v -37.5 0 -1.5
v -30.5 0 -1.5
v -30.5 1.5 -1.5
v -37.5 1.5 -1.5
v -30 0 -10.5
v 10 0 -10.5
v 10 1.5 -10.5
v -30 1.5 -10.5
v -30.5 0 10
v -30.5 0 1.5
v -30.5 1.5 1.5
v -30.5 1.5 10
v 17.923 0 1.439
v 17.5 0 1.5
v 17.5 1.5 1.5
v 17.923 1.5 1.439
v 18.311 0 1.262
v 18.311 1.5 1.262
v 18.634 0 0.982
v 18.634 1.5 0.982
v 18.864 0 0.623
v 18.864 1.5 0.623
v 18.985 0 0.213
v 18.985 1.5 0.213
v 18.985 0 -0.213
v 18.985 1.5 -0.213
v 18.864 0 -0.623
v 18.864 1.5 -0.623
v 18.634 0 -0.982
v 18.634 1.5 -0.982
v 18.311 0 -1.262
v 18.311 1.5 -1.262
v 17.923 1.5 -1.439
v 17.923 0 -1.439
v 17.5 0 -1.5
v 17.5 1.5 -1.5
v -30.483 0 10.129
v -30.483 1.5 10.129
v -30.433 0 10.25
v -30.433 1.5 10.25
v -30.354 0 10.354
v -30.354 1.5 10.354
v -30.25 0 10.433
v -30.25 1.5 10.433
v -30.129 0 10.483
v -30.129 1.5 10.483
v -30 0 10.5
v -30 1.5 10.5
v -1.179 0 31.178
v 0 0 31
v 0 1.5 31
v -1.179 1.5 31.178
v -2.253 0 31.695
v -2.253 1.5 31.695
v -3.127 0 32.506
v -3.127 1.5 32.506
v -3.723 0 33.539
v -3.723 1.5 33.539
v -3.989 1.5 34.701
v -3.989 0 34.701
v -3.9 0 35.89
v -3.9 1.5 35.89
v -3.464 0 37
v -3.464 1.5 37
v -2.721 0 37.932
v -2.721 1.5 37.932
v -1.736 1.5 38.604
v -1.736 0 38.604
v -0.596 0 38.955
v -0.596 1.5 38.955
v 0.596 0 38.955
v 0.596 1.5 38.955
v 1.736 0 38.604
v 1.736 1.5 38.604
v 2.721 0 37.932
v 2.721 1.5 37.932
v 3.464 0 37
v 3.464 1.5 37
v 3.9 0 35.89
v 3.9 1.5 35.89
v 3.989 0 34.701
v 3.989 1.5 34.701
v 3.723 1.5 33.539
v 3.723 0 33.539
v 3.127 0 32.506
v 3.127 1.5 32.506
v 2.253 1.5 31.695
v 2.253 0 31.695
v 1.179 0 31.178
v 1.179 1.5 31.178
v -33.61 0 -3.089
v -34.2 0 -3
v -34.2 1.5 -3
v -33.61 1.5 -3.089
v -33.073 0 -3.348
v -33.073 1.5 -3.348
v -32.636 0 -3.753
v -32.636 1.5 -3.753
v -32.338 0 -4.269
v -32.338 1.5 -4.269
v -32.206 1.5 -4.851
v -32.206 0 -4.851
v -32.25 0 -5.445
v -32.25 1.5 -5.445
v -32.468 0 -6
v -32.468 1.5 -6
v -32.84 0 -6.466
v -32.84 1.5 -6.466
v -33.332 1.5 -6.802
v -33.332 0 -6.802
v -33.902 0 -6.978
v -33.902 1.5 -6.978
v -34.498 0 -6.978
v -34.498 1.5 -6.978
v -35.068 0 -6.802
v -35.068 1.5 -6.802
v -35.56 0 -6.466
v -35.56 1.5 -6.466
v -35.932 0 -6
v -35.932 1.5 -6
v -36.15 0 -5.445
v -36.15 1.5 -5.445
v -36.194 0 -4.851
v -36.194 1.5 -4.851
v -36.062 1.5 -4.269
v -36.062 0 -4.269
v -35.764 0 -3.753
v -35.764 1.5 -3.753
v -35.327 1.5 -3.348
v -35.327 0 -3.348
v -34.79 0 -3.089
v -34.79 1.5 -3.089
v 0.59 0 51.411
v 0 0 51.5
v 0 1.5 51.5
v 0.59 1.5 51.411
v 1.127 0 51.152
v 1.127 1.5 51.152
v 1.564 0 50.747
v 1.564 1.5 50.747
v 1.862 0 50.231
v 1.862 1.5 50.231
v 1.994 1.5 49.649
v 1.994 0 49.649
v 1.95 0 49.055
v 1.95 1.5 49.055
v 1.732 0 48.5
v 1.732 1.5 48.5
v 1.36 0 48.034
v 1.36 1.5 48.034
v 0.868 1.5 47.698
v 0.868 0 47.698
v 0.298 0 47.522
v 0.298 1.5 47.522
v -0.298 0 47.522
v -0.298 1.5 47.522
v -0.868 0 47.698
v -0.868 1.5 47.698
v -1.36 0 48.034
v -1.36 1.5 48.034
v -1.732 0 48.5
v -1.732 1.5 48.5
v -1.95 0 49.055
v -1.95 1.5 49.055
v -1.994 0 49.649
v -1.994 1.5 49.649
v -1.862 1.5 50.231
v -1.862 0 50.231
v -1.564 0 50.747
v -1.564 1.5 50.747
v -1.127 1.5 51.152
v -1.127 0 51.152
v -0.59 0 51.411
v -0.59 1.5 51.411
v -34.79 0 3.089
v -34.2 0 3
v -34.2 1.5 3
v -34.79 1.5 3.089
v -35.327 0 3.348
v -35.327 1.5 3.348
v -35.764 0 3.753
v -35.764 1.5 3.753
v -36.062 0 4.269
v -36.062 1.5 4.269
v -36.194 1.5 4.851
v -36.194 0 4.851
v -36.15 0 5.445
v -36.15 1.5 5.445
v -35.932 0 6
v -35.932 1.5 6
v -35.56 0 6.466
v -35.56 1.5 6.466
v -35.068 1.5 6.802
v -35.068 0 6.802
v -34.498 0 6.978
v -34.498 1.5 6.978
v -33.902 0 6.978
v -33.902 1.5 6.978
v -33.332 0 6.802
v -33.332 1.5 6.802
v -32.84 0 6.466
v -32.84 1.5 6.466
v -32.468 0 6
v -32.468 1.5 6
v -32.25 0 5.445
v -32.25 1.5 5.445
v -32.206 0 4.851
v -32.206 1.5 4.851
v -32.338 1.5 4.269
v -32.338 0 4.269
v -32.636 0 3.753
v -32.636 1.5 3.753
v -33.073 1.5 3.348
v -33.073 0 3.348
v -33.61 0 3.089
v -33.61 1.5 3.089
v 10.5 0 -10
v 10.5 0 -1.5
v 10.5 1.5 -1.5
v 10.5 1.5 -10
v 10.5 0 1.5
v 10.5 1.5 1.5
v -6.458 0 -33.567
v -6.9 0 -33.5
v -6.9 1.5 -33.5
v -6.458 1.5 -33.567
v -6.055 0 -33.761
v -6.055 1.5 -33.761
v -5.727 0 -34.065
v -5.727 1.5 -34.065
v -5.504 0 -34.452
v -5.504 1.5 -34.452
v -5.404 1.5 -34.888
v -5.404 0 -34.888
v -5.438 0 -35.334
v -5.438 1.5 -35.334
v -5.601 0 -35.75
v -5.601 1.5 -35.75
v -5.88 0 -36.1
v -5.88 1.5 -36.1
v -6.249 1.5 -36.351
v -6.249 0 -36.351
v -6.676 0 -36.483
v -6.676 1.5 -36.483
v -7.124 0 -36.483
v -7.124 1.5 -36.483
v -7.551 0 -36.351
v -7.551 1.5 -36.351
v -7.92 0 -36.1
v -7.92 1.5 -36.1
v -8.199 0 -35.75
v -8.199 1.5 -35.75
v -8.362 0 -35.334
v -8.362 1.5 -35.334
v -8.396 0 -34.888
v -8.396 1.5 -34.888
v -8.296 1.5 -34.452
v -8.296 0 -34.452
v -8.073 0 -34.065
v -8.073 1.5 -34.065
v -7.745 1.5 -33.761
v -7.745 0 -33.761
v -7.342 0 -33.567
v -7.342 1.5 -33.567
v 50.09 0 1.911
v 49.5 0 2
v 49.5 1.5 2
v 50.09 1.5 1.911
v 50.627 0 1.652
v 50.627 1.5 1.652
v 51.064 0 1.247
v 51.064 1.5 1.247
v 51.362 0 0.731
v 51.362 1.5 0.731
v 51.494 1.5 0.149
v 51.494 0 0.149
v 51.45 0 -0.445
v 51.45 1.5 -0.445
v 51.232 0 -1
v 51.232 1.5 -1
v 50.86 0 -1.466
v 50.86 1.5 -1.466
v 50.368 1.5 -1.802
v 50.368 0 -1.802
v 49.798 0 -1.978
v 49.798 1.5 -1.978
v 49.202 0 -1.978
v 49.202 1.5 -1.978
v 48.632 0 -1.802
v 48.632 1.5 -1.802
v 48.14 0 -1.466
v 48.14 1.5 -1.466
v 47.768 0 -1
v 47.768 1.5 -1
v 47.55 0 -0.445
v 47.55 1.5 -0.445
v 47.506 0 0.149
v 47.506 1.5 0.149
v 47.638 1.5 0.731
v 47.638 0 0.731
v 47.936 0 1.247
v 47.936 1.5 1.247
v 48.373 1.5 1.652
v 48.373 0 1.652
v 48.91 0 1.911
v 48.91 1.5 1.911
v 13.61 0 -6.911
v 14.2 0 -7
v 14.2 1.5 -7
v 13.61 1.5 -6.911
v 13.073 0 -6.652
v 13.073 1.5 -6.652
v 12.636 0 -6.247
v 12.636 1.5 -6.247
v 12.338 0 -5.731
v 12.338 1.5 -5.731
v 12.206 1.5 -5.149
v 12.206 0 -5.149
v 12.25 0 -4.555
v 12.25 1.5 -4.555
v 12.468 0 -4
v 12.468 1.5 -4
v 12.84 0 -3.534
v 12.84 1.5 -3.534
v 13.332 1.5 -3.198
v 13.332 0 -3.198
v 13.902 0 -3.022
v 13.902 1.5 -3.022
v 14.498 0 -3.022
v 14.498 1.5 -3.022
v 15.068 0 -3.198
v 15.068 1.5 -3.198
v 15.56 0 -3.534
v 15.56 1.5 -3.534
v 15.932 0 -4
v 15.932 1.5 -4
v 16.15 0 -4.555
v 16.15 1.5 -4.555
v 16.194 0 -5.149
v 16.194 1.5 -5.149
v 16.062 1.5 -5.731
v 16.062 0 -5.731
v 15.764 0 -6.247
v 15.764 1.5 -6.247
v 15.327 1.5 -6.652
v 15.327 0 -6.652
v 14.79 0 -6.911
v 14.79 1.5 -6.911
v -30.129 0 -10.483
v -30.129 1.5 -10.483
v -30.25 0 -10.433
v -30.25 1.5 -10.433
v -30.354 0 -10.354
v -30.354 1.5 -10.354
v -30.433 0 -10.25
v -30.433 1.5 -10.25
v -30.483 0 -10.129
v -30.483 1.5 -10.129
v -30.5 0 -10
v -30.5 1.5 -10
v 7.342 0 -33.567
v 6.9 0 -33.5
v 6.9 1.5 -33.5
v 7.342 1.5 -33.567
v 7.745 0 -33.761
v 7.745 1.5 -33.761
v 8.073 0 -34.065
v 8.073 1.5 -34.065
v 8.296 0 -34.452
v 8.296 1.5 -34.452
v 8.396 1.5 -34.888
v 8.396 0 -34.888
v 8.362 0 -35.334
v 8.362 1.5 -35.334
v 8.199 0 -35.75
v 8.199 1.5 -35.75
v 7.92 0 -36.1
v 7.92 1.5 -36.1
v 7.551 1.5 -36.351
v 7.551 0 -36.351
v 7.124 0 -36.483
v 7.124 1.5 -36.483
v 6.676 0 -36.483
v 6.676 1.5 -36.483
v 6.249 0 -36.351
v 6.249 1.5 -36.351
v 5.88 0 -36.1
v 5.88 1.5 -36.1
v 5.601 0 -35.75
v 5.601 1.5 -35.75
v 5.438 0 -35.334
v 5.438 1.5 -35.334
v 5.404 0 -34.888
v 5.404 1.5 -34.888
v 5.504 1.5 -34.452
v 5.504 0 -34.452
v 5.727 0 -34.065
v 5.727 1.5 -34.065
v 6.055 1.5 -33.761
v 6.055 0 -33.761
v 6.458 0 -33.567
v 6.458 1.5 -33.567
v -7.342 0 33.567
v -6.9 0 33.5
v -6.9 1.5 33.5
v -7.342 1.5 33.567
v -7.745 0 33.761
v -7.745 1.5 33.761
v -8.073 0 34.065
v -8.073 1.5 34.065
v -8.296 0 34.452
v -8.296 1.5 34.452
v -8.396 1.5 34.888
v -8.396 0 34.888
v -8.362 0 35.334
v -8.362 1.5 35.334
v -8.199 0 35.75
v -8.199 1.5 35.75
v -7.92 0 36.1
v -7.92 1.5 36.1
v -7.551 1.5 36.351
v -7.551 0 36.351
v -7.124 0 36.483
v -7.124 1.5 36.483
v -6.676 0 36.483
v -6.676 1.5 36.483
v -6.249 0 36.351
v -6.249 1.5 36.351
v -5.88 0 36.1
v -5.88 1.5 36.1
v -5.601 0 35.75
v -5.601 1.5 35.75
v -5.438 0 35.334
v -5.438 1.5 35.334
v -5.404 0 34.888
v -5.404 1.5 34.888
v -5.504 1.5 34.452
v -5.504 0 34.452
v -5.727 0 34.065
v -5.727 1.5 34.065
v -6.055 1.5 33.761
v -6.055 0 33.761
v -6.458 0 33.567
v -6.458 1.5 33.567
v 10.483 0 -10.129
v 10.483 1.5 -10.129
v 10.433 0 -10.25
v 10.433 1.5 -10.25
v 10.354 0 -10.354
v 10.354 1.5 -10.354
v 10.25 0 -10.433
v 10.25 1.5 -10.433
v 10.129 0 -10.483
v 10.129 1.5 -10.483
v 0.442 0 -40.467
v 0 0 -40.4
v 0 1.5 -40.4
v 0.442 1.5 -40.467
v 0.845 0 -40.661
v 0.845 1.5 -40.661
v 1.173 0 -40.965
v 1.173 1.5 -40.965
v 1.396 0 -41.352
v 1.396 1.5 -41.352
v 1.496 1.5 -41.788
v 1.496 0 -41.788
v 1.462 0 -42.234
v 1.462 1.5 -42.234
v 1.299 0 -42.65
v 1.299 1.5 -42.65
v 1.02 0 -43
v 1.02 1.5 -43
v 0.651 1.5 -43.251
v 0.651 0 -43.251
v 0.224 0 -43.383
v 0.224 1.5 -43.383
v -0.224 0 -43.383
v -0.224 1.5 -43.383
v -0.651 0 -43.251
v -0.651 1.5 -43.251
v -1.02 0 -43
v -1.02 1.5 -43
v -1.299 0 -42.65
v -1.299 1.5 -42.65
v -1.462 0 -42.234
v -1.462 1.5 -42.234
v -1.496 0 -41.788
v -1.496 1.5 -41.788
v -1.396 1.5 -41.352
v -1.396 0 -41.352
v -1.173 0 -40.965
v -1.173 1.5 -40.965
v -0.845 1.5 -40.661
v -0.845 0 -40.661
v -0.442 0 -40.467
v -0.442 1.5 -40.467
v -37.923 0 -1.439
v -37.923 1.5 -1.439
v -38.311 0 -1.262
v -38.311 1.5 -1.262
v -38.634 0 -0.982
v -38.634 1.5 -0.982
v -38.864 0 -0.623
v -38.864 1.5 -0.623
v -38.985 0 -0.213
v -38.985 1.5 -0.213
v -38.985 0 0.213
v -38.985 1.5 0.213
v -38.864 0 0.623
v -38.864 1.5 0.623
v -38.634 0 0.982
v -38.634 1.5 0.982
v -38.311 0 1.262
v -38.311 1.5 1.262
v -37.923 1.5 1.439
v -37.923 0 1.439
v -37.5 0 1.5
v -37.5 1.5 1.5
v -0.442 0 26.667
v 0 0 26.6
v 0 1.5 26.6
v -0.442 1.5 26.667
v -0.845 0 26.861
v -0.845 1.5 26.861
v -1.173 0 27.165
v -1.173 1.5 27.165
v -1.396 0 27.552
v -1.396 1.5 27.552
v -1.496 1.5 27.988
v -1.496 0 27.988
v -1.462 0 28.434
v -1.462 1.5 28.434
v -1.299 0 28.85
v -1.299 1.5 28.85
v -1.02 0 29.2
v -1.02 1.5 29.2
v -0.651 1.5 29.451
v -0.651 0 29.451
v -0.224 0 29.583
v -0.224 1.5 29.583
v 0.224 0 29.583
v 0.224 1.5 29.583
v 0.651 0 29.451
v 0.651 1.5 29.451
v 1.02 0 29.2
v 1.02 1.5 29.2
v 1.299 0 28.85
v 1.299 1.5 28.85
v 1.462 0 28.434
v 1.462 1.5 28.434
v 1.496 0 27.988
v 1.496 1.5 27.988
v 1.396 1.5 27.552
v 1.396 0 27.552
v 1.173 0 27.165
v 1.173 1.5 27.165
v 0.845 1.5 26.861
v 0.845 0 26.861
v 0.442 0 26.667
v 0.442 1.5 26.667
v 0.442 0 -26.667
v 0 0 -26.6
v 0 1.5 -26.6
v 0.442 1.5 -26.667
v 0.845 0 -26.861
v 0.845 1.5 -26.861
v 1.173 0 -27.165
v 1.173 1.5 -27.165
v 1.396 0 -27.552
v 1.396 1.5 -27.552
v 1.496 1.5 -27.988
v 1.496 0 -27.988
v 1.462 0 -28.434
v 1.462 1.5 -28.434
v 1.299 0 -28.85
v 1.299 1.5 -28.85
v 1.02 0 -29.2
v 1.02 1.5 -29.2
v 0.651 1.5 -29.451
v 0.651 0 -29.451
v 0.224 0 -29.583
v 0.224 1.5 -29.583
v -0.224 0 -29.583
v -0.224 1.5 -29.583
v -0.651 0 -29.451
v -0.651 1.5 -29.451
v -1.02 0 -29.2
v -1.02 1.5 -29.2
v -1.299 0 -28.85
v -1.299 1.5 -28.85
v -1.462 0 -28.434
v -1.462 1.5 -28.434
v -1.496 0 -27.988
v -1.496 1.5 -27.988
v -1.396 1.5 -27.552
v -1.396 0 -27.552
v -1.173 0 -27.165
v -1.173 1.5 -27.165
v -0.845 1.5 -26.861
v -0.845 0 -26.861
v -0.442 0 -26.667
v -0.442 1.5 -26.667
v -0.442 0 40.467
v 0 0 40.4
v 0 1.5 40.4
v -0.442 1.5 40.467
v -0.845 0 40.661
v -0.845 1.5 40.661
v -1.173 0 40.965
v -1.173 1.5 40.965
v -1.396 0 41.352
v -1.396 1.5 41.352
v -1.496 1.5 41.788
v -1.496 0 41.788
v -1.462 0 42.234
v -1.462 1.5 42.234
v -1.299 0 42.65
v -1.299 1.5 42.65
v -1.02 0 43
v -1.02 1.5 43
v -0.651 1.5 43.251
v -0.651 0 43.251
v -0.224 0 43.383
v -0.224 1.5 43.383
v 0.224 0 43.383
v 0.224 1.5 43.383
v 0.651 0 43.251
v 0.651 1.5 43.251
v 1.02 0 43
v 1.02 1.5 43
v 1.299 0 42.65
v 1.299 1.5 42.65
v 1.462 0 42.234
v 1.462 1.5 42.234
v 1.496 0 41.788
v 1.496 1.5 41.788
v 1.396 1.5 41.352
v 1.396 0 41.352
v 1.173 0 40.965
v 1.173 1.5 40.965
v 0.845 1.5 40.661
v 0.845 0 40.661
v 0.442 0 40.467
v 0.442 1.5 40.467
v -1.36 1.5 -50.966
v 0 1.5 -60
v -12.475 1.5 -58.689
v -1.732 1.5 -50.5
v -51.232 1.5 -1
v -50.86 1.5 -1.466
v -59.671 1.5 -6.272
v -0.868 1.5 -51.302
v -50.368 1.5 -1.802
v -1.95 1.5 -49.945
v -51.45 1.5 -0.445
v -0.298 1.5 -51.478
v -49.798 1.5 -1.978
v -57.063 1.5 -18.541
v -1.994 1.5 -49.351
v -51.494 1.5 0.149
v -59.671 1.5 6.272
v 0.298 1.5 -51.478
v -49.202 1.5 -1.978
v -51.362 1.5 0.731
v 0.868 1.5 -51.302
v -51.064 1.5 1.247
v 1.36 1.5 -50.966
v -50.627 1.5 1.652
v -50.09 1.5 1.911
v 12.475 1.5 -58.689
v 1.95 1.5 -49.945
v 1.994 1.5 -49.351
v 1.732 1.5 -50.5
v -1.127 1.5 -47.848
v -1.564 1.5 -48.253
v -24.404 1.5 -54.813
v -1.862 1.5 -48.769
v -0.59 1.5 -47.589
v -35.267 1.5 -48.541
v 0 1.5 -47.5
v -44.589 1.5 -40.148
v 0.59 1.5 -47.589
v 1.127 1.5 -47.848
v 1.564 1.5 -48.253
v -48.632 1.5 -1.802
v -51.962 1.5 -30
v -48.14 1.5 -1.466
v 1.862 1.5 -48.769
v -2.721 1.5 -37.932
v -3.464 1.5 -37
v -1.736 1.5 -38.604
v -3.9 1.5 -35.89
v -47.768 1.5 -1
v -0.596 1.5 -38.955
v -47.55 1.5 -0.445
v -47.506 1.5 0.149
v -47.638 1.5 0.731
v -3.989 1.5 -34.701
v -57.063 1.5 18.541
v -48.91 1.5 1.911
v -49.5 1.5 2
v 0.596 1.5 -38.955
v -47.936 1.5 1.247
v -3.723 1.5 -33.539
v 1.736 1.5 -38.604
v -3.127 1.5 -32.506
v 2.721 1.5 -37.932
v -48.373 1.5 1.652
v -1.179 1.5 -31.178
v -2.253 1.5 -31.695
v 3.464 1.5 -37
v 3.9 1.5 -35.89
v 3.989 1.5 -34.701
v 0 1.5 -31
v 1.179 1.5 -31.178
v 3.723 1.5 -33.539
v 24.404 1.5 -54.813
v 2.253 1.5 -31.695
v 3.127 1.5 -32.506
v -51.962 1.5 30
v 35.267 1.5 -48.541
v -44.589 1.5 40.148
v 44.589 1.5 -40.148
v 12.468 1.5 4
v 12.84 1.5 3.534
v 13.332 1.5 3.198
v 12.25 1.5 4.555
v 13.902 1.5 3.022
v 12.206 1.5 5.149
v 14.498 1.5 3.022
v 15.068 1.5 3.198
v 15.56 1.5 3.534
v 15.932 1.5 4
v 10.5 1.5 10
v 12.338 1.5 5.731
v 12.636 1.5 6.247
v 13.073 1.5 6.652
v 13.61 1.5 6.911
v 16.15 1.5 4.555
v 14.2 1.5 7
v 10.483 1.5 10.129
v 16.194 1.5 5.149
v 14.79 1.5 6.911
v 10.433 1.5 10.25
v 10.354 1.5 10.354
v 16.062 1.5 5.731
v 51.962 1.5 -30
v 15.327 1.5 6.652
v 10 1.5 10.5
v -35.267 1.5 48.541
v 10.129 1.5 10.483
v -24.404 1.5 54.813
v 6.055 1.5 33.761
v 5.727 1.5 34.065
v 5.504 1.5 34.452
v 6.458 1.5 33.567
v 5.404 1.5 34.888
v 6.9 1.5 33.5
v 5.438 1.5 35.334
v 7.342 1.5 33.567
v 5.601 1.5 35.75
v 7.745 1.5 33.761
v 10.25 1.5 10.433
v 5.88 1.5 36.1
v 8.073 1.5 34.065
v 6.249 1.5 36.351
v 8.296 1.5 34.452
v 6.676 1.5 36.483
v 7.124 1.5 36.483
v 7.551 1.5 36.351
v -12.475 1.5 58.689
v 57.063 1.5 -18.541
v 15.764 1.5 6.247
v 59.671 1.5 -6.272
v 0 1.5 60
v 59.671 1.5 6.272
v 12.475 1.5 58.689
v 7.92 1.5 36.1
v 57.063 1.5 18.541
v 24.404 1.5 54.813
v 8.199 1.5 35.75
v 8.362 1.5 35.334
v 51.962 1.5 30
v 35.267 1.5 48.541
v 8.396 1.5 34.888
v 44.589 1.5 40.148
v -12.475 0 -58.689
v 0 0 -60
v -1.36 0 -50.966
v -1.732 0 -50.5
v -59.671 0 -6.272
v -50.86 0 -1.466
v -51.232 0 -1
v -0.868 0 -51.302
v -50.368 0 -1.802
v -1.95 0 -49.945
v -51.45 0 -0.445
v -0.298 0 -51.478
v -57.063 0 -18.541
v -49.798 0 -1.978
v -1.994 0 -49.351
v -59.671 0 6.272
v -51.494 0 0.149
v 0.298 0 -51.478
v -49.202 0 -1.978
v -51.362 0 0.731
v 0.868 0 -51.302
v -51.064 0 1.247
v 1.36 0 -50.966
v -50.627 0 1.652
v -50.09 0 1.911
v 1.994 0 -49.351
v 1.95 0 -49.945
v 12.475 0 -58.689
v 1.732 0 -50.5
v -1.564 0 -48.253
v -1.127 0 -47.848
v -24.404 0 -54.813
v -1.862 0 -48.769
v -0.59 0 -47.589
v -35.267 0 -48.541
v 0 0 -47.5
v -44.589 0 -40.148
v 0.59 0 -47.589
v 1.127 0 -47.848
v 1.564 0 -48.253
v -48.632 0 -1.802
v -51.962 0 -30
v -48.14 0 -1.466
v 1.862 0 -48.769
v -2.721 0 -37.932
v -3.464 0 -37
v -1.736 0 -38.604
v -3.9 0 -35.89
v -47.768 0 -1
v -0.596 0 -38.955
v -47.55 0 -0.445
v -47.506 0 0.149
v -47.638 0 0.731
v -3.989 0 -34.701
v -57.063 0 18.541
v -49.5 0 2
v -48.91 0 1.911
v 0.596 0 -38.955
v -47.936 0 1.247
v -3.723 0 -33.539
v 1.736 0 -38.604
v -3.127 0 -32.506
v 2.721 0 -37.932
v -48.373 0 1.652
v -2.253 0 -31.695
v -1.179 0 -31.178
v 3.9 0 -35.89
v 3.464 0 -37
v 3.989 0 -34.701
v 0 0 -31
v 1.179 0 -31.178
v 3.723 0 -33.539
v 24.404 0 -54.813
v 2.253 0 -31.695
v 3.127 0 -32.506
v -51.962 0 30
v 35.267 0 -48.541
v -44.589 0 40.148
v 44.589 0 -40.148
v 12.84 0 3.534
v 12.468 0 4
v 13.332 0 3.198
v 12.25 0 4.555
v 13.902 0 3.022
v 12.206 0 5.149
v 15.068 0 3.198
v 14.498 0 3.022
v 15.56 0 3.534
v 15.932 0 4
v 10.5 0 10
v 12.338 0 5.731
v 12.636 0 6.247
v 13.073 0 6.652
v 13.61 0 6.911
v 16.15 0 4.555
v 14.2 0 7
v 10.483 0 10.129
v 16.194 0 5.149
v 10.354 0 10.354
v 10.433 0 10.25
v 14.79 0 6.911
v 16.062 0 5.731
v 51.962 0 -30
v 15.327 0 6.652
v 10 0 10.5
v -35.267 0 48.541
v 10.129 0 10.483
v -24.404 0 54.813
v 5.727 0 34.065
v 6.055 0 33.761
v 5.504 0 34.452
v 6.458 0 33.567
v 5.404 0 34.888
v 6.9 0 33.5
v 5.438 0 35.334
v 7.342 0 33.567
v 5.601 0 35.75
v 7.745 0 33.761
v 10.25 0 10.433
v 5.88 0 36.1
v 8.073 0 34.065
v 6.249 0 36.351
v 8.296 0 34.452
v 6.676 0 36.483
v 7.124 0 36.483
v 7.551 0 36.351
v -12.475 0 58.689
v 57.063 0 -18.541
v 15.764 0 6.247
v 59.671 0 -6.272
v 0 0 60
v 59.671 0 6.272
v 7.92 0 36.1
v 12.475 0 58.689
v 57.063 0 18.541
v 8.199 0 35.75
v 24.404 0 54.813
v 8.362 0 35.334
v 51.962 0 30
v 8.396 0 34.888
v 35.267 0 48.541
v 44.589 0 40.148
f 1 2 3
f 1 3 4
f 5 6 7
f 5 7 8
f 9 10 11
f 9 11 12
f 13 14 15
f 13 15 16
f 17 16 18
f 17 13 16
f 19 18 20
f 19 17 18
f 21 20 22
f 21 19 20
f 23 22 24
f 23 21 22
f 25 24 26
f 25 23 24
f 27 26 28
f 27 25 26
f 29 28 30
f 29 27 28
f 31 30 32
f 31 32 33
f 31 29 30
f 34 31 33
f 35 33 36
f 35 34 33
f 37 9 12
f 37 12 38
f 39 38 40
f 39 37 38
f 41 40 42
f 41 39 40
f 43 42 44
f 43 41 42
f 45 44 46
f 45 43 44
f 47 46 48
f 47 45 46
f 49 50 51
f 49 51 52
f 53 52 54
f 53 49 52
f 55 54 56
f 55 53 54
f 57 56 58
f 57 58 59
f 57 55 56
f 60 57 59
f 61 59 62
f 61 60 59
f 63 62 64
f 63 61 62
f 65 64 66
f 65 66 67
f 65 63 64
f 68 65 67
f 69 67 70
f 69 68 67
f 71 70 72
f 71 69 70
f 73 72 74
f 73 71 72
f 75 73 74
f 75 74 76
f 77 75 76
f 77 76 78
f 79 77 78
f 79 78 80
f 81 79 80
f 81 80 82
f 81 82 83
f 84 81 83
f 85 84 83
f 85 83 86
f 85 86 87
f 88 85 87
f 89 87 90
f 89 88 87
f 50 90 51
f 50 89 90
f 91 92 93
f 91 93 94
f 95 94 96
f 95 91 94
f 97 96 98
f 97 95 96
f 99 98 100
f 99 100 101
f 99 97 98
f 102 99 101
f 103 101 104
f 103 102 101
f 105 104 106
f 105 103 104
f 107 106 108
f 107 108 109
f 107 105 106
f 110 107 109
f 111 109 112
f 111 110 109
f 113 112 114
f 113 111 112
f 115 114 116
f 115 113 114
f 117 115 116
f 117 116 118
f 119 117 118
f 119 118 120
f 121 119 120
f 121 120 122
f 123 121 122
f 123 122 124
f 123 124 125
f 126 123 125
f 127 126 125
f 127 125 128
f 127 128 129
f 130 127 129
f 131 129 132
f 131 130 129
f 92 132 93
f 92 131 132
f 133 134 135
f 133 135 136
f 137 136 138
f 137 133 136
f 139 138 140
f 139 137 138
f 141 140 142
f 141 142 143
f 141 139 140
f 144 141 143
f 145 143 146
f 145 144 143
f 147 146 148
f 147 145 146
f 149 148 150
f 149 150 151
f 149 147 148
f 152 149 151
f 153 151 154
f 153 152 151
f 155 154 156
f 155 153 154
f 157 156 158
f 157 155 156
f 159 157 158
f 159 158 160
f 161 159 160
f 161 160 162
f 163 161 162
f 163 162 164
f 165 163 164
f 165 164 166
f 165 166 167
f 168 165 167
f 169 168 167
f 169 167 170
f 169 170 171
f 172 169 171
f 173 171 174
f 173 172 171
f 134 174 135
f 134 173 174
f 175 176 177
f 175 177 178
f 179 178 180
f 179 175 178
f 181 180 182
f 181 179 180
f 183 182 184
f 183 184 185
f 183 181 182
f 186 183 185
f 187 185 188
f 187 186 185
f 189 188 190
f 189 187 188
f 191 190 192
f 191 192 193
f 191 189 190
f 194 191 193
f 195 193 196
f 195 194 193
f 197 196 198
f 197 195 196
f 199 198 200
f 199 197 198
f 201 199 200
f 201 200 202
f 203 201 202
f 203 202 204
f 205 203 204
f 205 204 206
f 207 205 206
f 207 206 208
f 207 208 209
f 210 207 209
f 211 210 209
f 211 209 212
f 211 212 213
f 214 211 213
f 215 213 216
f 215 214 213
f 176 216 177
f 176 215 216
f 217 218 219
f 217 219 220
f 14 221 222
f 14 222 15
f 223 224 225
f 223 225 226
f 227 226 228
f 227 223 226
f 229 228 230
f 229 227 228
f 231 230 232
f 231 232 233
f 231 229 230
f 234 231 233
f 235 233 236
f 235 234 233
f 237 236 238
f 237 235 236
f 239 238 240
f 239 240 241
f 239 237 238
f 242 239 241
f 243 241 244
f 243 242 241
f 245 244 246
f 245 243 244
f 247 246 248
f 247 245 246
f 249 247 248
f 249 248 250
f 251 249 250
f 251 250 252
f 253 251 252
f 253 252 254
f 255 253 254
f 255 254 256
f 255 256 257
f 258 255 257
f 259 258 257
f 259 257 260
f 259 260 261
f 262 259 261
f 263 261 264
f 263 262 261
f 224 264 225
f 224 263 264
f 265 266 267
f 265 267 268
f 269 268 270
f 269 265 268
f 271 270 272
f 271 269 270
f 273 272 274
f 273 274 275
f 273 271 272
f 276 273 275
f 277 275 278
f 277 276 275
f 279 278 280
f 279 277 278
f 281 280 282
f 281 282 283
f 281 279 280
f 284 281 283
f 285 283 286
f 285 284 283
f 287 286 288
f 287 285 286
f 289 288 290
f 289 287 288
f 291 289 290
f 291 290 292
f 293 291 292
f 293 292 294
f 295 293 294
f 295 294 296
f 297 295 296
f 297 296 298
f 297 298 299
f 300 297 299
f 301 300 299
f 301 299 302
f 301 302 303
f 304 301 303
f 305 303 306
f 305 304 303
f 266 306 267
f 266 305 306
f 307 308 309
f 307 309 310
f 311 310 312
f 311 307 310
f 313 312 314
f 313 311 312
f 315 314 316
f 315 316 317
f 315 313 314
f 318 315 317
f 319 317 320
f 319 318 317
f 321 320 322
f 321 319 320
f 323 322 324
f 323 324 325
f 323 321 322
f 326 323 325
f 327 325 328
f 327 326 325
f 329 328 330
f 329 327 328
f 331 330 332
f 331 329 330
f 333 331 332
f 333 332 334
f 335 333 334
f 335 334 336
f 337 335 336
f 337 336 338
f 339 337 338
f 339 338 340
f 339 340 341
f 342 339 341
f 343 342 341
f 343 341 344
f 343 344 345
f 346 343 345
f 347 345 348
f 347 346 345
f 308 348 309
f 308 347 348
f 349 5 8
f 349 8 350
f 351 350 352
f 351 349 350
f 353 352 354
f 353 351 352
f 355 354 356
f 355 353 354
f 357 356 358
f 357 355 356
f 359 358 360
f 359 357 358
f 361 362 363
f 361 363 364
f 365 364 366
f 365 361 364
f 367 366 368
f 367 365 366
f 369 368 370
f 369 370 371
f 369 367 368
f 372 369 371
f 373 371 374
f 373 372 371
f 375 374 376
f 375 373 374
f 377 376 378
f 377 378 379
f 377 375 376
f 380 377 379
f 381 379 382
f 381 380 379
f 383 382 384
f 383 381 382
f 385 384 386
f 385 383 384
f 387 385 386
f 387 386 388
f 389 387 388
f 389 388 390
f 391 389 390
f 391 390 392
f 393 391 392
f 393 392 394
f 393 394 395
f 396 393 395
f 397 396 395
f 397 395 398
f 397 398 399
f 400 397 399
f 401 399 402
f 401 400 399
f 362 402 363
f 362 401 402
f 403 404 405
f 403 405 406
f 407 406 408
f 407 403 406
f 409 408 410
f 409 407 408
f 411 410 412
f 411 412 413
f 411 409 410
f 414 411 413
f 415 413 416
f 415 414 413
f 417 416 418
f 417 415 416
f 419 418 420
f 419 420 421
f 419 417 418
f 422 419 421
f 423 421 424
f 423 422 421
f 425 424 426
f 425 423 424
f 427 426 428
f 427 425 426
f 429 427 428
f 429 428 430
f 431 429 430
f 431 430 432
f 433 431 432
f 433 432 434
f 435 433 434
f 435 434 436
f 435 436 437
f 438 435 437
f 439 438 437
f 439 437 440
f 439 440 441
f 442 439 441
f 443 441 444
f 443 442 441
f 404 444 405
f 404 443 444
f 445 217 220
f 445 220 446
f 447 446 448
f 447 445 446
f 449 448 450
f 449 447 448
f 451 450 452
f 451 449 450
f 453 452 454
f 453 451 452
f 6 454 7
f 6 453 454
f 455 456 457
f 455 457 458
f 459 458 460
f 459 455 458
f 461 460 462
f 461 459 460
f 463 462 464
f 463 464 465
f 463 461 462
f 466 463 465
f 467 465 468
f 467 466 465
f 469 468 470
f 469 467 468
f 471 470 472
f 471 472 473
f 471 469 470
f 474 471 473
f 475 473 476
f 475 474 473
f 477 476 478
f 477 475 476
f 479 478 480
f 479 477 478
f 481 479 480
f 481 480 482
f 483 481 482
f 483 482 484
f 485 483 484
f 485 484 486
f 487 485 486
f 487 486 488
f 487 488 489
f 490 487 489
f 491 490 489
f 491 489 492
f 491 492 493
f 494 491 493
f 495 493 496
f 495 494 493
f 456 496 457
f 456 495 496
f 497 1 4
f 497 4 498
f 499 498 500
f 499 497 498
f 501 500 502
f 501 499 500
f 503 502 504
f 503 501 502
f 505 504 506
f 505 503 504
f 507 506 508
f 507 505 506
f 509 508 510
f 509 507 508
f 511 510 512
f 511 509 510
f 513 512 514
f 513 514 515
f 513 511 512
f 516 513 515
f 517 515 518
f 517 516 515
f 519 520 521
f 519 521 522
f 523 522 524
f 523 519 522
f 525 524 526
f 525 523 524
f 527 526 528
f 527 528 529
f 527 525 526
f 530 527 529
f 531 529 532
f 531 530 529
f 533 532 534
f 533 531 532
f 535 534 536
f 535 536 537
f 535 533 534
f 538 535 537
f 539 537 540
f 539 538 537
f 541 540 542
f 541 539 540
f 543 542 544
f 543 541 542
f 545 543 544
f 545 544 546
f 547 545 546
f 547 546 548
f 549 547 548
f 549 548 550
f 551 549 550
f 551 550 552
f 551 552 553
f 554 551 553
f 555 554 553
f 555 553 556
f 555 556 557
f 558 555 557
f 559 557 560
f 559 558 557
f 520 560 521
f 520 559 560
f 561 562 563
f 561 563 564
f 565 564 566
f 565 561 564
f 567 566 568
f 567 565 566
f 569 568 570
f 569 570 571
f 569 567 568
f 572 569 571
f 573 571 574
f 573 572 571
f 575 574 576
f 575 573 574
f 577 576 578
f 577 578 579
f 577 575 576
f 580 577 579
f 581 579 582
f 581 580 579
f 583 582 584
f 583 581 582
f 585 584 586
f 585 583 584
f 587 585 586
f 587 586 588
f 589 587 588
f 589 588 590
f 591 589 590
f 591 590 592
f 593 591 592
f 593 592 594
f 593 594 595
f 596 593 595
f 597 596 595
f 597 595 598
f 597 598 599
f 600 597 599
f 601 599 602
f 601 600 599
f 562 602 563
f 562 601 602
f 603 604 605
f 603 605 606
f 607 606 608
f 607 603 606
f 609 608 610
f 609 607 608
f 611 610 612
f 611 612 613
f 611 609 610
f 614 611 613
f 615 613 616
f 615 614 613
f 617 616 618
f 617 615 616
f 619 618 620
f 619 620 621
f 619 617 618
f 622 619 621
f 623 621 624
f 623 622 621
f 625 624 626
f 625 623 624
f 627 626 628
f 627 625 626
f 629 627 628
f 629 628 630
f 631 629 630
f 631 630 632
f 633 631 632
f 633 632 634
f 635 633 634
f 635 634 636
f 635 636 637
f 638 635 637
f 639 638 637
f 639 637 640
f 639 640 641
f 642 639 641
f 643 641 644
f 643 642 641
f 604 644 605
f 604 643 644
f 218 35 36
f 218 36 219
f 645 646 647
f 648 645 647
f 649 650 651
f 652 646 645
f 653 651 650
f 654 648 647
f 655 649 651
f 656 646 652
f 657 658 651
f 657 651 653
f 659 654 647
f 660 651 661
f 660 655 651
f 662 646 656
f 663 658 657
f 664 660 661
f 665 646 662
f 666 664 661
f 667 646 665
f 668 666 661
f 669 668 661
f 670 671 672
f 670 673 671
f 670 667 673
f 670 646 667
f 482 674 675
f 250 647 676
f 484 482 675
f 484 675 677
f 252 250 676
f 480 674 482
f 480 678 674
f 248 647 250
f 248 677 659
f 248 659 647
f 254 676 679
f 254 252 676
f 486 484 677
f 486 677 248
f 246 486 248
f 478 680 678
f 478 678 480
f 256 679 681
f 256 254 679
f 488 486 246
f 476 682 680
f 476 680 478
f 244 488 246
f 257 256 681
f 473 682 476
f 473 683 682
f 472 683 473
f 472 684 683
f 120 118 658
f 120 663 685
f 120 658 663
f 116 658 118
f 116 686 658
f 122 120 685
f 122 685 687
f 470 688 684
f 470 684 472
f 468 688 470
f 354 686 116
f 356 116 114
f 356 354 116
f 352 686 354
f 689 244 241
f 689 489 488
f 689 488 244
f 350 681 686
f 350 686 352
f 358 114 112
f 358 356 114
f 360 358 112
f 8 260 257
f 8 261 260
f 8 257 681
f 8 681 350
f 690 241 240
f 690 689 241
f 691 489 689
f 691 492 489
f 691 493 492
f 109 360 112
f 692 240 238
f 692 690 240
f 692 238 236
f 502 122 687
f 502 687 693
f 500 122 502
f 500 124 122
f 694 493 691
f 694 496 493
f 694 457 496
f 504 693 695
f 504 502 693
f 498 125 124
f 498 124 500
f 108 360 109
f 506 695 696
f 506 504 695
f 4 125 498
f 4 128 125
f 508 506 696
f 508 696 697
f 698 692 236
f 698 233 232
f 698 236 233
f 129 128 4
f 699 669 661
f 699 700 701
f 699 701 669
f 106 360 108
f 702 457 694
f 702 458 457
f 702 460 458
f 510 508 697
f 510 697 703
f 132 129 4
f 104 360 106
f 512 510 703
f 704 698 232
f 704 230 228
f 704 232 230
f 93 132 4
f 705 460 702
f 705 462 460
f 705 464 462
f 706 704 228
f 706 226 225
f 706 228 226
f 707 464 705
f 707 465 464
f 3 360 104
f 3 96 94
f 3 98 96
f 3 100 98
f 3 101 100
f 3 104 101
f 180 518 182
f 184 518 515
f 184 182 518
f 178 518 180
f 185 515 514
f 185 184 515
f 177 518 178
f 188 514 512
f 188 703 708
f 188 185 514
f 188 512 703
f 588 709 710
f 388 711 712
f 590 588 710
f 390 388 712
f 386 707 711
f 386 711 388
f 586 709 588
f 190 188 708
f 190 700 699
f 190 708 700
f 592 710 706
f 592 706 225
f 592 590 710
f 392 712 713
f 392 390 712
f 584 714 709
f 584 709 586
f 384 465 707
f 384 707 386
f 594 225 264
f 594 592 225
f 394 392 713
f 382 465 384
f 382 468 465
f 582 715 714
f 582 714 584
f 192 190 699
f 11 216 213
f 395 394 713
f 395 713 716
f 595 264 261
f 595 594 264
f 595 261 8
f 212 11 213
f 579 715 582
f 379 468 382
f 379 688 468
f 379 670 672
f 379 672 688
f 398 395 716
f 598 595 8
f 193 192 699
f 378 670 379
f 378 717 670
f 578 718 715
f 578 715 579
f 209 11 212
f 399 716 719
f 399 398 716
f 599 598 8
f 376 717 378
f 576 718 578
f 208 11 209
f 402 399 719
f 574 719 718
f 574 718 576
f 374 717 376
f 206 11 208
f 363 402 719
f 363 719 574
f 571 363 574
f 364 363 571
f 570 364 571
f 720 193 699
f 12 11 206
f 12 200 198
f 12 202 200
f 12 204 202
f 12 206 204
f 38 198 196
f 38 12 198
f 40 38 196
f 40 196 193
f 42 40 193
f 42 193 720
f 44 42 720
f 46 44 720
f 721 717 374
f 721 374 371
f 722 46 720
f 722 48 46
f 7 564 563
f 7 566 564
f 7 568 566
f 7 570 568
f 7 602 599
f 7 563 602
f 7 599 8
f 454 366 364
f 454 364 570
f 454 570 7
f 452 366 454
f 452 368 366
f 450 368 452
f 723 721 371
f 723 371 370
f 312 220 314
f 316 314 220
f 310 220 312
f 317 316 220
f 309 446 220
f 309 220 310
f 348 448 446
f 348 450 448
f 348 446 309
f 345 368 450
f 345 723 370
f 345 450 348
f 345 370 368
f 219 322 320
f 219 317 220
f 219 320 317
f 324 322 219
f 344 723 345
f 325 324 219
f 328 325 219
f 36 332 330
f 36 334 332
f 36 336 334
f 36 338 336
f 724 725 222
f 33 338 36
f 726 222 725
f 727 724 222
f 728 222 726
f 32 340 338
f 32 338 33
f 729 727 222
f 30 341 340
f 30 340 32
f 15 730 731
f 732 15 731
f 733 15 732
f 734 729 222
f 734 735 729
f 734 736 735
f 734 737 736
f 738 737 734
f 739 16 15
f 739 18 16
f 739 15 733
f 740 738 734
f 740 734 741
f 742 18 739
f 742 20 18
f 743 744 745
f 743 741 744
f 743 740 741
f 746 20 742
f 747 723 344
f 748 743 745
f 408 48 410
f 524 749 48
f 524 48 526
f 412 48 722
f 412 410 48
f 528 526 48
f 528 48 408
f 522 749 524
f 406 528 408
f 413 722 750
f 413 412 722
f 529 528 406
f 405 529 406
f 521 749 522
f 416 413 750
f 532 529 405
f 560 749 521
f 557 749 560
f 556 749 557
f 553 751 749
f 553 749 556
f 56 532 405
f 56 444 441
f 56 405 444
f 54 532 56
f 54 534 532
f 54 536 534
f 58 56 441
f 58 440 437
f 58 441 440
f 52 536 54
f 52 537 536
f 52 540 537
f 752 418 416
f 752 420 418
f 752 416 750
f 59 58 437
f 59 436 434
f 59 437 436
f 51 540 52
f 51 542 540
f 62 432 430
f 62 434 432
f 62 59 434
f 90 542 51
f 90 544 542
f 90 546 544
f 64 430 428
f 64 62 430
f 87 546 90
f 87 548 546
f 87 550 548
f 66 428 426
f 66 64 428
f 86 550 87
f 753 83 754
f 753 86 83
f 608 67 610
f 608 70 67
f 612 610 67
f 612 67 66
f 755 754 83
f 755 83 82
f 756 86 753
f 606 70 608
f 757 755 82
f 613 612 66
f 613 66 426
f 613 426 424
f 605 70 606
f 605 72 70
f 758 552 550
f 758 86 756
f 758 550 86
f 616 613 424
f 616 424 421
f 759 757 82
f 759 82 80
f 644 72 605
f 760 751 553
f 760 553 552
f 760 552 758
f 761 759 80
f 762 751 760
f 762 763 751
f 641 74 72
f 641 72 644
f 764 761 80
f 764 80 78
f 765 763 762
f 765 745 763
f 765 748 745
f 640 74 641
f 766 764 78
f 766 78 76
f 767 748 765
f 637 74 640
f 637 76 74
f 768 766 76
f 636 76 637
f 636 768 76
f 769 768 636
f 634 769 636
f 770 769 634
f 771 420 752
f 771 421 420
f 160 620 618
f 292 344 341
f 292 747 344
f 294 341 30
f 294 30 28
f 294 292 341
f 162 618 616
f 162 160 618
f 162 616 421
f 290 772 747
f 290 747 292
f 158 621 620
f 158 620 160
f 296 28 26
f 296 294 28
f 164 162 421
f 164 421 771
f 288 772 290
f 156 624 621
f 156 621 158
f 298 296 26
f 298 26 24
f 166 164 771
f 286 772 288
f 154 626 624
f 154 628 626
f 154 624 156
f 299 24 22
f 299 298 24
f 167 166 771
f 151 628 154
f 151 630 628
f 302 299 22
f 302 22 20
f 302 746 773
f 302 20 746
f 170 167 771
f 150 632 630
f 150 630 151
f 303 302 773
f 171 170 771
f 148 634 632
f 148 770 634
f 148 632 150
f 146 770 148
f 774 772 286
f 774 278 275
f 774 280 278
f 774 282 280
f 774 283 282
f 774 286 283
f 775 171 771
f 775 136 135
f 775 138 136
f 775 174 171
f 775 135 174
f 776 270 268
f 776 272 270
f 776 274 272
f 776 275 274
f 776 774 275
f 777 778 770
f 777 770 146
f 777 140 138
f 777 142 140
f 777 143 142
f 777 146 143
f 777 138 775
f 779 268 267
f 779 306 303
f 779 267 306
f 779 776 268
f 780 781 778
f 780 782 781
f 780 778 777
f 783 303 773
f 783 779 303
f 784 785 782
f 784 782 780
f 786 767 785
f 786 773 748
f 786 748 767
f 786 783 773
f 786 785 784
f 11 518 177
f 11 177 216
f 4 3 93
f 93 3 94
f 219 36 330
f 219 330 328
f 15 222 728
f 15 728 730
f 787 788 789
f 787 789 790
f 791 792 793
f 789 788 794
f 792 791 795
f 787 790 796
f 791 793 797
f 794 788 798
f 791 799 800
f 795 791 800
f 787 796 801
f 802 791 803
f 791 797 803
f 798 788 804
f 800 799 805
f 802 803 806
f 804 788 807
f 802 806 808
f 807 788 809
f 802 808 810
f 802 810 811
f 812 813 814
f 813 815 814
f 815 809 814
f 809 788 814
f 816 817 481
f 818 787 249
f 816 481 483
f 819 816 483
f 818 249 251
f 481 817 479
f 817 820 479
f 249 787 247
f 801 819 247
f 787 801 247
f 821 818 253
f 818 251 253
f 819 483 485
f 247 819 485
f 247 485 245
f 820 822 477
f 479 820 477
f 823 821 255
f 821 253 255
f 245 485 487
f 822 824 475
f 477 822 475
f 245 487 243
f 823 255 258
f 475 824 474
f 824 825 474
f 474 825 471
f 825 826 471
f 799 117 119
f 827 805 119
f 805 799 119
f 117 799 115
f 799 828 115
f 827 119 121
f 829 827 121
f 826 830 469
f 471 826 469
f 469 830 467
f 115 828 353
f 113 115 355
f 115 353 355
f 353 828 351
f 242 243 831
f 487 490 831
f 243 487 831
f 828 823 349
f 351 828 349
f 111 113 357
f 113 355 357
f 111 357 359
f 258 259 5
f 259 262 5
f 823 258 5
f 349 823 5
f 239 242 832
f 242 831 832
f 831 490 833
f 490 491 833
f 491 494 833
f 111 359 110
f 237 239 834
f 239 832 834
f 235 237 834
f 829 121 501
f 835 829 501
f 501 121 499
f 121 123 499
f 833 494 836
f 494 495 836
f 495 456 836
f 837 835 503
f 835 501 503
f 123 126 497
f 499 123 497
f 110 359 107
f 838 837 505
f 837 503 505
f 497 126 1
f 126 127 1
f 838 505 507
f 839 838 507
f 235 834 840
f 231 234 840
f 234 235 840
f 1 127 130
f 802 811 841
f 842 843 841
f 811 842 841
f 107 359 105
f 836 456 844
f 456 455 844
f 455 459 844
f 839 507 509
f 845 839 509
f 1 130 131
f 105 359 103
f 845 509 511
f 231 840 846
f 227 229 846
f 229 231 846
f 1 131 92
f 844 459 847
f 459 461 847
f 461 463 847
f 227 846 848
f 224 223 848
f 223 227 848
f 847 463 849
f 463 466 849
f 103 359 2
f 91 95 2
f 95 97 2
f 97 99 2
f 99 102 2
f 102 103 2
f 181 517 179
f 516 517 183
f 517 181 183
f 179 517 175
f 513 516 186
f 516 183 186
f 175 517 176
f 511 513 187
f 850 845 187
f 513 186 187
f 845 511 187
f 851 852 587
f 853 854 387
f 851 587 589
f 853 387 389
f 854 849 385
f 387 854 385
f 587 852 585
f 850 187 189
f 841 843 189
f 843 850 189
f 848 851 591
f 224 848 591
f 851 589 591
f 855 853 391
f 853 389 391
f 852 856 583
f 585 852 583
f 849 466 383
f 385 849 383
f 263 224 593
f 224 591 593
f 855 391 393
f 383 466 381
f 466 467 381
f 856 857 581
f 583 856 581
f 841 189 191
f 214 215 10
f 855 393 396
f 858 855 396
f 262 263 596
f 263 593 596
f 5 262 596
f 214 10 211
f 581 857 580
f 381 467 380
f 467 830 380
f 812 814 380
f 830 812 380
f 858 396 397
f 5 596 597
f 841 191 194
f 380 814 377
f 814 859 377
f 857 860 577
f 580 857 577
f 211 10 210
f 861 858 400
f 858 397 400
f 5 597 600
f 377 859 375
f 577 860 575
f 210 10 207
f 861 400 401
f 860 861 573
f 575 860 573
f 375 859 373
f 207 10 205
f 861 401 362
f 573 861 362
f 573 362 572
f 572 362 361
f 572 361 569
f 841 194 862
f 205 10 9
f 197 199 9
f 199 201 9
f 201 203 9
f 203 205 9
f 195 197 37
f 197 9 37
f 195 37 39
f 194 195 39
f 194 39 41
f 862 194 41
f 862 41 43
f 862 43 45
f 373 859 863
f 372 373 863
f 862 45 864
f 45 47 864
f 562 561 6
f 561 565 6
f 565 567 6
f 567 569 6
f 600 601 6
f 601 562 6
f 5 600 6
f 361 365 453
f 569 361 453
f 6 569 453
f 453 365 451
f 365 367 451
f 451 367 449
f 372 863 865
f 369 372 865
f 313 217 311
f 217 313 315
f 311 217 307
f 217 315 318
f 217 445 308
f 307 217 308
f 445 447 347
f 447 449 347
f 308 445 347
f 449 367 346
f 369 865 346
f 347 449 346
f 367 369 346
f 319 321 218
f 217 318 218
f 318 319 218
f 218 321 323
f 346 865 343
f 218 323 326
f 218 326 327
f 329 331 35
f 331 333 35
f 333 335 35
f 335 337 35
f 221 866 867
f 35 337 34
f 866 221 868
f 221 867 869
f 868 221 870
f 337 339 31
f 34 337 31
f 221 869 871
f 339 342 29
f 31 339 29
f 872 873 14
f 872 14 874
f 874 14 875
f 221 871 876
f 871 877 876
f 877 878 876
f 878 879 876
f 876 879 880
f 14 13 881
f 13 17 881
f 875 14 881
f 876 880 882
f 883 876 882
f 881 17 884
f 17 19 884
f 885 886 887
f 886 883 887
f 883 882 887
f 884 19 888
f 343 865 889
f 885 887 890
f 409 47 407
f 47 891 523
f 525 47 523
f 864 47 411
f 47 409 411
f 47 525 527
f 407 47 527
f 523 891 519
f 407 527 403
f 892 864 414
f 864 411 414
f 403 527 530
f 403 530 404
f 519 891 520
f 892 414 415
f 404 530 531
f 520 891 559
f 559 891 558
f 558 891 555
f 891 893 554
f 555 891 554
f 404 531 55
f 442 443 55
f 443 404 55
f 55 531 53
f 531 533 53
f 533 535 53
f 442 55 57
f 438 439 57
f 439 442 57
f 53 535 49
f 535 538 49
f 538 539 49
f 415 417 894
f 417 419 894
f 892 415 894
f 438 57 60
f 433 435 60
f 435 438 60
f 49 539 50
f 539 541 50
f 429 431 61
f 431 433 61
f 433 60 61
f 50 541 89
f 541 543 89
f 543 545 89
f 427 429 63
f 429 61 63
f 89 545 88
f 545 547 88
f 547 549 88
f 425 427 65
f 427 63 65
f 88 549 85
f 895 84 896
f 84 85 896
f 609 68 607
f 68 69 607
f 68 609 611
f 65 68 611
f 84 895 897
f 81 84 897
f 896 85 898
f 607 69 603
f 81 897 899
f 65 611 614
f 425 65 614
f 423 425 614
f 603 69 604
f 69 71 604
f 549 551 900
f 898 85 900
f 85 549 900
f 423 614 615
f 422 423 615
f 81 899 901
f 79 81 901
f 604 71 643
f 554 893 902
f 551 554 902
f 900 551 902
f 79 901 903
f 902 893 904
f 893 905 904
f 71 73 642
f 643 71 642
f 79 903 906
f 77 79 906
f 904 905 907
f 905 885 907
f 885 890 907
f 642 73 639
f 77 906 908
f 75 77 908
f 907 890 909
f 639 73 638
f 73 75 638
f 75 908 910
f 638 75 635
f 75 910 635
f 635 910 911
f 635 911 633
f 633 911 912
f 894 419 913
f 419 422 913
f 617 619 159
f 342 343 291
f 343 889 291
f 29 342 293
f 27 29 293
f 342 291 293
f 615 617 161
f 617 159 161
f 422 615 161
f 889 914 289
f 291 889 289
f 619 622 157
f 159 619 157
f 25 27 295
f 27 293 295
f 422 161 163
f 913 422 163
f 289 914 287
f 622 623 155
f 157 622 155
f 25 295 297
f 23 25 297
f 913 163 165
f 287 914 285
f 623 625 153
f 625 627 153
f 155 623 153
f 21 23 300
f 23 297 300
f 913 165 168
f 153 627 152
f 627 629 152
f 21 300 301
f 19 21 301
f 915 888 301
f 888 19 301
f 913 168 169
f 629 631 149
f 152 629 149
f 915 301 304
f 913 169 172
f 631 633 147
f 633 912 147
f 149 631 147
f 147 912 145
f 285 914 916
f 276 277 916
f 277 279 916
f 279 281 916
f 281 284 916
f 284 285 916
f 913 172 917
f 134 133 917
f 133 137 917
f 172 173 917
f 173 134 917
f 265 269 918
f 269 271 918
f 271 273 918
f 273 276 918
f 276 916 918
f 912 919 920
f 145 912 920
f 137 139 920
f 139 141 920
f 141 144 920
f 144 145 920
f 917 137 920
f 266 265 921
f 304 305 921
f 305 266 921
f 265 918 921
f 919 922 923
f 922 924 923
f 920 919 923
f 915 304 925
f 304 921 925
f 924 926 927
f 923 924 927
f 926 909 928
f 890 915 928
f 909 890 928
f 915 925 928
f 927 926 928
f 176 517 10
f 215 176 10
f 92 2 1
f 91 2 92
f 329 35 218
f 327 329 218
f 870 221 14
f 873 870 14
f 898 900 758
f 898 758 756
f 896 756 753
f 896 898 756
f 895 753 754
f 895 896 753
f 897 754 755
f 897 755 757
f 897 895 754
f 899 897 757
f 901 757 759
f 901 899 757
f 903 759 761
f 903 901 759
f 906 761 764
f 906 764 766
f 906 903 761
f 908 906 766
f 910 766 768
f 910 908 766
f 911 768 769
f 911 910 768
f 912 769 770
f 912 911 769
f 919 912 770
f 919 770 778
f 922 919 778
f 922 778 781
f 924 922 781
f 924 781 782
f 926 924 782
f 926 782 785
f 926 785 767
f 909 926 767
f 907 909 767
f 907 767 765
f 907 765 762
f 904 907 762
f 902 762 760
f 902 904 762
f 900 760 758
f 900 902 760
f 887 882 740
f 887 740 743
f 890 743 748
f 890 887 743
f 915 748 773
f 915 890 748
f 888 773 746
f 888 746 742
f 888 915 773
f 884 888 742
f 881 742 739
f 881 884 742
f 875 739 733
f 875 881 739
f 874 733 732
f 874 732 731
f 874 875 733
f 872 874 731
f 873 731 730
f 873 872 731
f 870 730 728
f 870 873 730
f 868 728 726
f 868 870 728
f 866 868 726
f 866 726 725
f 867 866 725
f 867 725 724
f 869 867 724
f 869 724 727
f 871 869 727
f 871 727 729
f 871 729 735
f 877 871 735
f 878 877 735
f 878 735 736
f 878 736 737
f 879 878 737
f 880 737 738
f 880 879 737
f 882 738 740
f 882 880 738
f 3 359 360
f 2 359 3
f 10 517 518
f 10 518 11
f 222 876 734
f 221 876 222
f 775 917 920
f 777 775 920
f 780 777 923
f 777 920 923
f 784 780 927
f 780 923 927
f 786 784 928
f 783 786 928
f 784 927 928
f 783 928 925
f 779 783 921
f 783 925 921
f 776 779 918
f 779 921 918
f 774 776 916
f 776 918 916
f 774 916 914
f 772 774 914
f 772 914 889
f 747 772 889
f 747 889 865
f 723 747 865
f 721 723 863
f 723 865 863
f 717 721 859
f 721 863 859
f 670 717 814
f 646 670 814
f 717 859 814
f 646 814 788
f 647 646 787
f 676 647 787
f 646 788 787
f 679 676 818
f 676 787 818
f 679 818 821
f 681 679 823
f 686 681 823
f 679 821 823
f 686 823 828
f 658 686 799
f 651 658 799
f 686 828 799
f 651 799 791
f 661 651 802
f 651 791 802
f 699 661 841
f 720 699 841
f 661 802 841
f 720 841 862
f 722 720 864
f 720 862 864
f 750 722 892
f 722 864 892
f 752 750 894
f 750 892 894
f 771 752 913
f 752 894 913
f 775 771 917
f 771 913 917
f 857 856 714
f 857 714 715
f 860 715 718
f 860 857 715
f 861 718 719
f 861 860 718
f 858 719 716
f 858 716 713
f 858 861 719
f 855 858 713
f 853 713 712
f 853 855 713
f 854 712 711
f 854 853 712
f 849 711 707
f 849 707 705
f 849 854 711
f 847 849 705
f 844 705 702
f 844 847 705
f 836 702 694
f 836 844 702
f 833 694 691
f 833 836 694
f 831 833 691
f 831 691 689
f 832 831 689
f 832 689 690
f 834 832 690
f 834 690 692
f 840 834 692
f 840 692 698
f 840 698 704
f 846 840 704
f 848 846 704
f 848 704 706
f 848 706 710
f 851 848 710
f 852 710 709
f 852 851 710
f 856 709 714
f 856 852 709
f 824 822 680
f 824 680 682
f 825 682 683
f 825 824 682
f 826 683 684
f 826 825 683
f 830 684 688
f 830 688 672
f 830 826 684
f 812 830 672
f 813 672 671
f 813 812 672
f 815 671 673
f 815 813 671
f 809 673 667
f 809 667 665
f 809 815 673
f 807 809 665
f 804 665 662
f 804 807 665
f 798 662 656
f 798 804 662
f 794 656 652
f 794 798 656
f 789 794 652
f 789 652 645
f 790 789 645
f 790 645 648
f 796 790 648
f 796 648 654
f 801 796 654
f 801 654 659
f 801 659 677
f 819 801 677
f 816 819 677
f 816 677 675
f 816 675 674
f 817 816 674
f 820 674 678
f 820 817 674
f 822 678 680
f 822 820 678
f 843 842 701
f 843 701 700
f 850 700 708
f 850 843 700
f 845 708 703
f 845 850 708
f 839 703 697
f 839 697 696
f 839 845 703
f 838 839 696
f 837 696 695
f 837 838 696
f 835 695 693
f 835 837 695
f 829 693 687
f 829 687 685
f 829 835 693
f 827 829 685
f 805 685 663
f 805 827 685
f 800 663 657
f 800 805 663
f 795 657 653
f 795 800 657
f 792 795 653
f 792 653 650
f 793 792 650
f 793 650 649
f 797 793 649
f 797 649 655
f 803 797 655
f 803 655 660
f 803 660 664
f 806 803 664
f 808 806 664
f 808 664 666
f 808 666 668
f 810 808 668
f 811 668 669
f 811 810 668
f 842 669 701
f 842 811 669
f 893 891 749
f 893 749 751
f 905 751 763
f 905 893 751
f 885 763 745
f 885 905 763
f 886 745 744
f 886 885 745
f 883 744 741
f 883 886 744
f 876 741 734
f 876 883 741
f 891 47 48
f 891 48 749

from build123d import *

# Parameters (mm, degrees)
SKETCH1_R           = 60
SKETCH1_R_2         = 2
SKETCH1_R_3         = 4
SKETCH1_R_4         = 1.5
BOSS_EXTRUDE1_DEPTH = 1.5


with BuildPart() as part:
    # Sketch1 → Boss-Extrude1 (new body)
    with BuildSketch(Plane(origin=(0, 0, 0), x_dir=(1, 0, 0), z_dir=(0, 1, 0))):
        with Locations(Location((0, 0, 0), (0, 0, 270))):
            Circle(SKETCH1_R)
        with Locations(Location((0, 49.5, 0), (0, 0, 270))):
            Circle(SKETCH1_R_2, mode=Mode.SUBTRACT)
        with Locations(Location((-49.5, 0, 0), (0, 0, 270))):
            Circle(SKETCH1_R_2, mode=Mode.SUBTRACT)
        with Locations(Location((0, -49.5, 0), (0, 0, 270))):
            Circle(SKETCH1_R_2, mode=Mode.SUBTRACT)
        with Locations(Location((49.5, 0, 0), (0, 0, 270))):
            Circle(SKETCH1_R_2, mode=Mode.SUBTRACT)
        with Locations(Location((0, 35, 0), (0, 0, 270))):
            Circle(SKETCH1_R_3, mode=Mode.SUBTRACT)
        with Locations(Location((0, 41.9, 0), (0, 0, 270))):
            Circle(SKETCH1_R_4, mode=Mode.SUBTRACT)
        with Locations(Location((6.9, 35, 0), (0, 0, 270))):
            Circle(SKETCH1_R_4, mode=Mode.SUBTRACT)
        with Locations(Location((0, 28.1, 0), (0, 0, 270))):
            Circle(SKETCH1_R_4, mode=Mode.SUBTRACT)
        with Locations(Location((-6.9, 35, 0), (0, 0, 270))):
            Circle(SKETCH1_R_4, mode=Mode.SUBTRACT)
        with Locations(Location((0, -35, 0), (0, 0, 90))):
            Circle(SKETCH1_R_3, mode=Mode.SUBTRACT)
        with Locations(Location((0, -28.1, 0), (0, 0, 90))):
            Circle(SKETCH1_R_4, mode=Mode.SUBTRACT)
        with Locations(Location((-6.9, -35, 0), (0, 0, 90))):
            Circle(SKETCH1_R_4, mode=Mode.SUBTRACT)
        with Locations(Location((0, -41.9, 0), (0, 0, 90))):
            Circle(SKETCH1_R_4, mode=Mode.SUBTRACT)
        with Locations(Location((6.9, -35, 0), (0, 0, 90))):
            Circle(SKETCH1_R_4, mode=Mode.SUBTRACT)
        with Locations(Location((-34.2, 5, 0), (0, 0, 270))):
            Circle(SKETCH1_R_2, mode=Mode.SUBTRACT)
        with Locations(Location((-34.2, -5, 0), (0, 0, 90))):
            Circle(SKETCH1_R_2, mode=Mode.SUBTRACT)
        with Locations(Location((14.2, 5, 0), (0, 0, 90))):
            Circle(SKETCH1_R_2, mode=Mode.SUBTRACT)
        with Locations(Location((14.2, -5, 0), (0, 0, 270))):
            Circle(SKETCH1_R_2, mode=Mode.SUBTRACT)
        with BuildLine():
            Line((-37.5, -1.5), (-30.5, -1.5))
            Line((-30.5, -1.5), (-30.5, -10))
            ThreePointArc((-30.5, -10), (-30.353553391, -10.353553391), (-30, -10.5))
            Line((-30, -10.5), (10, -10.5))
            ThreePointArc((10, -10.5), (10.353553391, -10.353553391), (10.5, -10))
            Line((10.5, -10), (10.5, -1.5))
            Line((10.5, -1.5), (17.5, -1.5))
            ThreePointArc((17.5, -1.5), (19, 0), (17.5, 1.5))
            Line((17.5, 1.5), (10.5, 1.5))
            Line((10.5, 1.5), (10.5, 10))
            ThreePointArc((10.5, 10), (10.353553391, 10.353553391), (10, 10.5))
            Line((10, 10.5), (-30, 10.5))
            ThreePointArc((-30, 10.5), (-30.353553391, 10.353553391), (-30.5, 10))
            Line((-30.5, 10), (-30.5, 1.5))
            Line((-30.5, 1.5), (-37.5, 1.5))
            ThreePointArc((-37.5, 1.5), (-39, 0), (-37.5, -1.5))
        make_face(mode=Mode.SUBTRACT)
    extrude(amount=BOSS_EXTRUDE1_DEPTH)


solid = part.part
